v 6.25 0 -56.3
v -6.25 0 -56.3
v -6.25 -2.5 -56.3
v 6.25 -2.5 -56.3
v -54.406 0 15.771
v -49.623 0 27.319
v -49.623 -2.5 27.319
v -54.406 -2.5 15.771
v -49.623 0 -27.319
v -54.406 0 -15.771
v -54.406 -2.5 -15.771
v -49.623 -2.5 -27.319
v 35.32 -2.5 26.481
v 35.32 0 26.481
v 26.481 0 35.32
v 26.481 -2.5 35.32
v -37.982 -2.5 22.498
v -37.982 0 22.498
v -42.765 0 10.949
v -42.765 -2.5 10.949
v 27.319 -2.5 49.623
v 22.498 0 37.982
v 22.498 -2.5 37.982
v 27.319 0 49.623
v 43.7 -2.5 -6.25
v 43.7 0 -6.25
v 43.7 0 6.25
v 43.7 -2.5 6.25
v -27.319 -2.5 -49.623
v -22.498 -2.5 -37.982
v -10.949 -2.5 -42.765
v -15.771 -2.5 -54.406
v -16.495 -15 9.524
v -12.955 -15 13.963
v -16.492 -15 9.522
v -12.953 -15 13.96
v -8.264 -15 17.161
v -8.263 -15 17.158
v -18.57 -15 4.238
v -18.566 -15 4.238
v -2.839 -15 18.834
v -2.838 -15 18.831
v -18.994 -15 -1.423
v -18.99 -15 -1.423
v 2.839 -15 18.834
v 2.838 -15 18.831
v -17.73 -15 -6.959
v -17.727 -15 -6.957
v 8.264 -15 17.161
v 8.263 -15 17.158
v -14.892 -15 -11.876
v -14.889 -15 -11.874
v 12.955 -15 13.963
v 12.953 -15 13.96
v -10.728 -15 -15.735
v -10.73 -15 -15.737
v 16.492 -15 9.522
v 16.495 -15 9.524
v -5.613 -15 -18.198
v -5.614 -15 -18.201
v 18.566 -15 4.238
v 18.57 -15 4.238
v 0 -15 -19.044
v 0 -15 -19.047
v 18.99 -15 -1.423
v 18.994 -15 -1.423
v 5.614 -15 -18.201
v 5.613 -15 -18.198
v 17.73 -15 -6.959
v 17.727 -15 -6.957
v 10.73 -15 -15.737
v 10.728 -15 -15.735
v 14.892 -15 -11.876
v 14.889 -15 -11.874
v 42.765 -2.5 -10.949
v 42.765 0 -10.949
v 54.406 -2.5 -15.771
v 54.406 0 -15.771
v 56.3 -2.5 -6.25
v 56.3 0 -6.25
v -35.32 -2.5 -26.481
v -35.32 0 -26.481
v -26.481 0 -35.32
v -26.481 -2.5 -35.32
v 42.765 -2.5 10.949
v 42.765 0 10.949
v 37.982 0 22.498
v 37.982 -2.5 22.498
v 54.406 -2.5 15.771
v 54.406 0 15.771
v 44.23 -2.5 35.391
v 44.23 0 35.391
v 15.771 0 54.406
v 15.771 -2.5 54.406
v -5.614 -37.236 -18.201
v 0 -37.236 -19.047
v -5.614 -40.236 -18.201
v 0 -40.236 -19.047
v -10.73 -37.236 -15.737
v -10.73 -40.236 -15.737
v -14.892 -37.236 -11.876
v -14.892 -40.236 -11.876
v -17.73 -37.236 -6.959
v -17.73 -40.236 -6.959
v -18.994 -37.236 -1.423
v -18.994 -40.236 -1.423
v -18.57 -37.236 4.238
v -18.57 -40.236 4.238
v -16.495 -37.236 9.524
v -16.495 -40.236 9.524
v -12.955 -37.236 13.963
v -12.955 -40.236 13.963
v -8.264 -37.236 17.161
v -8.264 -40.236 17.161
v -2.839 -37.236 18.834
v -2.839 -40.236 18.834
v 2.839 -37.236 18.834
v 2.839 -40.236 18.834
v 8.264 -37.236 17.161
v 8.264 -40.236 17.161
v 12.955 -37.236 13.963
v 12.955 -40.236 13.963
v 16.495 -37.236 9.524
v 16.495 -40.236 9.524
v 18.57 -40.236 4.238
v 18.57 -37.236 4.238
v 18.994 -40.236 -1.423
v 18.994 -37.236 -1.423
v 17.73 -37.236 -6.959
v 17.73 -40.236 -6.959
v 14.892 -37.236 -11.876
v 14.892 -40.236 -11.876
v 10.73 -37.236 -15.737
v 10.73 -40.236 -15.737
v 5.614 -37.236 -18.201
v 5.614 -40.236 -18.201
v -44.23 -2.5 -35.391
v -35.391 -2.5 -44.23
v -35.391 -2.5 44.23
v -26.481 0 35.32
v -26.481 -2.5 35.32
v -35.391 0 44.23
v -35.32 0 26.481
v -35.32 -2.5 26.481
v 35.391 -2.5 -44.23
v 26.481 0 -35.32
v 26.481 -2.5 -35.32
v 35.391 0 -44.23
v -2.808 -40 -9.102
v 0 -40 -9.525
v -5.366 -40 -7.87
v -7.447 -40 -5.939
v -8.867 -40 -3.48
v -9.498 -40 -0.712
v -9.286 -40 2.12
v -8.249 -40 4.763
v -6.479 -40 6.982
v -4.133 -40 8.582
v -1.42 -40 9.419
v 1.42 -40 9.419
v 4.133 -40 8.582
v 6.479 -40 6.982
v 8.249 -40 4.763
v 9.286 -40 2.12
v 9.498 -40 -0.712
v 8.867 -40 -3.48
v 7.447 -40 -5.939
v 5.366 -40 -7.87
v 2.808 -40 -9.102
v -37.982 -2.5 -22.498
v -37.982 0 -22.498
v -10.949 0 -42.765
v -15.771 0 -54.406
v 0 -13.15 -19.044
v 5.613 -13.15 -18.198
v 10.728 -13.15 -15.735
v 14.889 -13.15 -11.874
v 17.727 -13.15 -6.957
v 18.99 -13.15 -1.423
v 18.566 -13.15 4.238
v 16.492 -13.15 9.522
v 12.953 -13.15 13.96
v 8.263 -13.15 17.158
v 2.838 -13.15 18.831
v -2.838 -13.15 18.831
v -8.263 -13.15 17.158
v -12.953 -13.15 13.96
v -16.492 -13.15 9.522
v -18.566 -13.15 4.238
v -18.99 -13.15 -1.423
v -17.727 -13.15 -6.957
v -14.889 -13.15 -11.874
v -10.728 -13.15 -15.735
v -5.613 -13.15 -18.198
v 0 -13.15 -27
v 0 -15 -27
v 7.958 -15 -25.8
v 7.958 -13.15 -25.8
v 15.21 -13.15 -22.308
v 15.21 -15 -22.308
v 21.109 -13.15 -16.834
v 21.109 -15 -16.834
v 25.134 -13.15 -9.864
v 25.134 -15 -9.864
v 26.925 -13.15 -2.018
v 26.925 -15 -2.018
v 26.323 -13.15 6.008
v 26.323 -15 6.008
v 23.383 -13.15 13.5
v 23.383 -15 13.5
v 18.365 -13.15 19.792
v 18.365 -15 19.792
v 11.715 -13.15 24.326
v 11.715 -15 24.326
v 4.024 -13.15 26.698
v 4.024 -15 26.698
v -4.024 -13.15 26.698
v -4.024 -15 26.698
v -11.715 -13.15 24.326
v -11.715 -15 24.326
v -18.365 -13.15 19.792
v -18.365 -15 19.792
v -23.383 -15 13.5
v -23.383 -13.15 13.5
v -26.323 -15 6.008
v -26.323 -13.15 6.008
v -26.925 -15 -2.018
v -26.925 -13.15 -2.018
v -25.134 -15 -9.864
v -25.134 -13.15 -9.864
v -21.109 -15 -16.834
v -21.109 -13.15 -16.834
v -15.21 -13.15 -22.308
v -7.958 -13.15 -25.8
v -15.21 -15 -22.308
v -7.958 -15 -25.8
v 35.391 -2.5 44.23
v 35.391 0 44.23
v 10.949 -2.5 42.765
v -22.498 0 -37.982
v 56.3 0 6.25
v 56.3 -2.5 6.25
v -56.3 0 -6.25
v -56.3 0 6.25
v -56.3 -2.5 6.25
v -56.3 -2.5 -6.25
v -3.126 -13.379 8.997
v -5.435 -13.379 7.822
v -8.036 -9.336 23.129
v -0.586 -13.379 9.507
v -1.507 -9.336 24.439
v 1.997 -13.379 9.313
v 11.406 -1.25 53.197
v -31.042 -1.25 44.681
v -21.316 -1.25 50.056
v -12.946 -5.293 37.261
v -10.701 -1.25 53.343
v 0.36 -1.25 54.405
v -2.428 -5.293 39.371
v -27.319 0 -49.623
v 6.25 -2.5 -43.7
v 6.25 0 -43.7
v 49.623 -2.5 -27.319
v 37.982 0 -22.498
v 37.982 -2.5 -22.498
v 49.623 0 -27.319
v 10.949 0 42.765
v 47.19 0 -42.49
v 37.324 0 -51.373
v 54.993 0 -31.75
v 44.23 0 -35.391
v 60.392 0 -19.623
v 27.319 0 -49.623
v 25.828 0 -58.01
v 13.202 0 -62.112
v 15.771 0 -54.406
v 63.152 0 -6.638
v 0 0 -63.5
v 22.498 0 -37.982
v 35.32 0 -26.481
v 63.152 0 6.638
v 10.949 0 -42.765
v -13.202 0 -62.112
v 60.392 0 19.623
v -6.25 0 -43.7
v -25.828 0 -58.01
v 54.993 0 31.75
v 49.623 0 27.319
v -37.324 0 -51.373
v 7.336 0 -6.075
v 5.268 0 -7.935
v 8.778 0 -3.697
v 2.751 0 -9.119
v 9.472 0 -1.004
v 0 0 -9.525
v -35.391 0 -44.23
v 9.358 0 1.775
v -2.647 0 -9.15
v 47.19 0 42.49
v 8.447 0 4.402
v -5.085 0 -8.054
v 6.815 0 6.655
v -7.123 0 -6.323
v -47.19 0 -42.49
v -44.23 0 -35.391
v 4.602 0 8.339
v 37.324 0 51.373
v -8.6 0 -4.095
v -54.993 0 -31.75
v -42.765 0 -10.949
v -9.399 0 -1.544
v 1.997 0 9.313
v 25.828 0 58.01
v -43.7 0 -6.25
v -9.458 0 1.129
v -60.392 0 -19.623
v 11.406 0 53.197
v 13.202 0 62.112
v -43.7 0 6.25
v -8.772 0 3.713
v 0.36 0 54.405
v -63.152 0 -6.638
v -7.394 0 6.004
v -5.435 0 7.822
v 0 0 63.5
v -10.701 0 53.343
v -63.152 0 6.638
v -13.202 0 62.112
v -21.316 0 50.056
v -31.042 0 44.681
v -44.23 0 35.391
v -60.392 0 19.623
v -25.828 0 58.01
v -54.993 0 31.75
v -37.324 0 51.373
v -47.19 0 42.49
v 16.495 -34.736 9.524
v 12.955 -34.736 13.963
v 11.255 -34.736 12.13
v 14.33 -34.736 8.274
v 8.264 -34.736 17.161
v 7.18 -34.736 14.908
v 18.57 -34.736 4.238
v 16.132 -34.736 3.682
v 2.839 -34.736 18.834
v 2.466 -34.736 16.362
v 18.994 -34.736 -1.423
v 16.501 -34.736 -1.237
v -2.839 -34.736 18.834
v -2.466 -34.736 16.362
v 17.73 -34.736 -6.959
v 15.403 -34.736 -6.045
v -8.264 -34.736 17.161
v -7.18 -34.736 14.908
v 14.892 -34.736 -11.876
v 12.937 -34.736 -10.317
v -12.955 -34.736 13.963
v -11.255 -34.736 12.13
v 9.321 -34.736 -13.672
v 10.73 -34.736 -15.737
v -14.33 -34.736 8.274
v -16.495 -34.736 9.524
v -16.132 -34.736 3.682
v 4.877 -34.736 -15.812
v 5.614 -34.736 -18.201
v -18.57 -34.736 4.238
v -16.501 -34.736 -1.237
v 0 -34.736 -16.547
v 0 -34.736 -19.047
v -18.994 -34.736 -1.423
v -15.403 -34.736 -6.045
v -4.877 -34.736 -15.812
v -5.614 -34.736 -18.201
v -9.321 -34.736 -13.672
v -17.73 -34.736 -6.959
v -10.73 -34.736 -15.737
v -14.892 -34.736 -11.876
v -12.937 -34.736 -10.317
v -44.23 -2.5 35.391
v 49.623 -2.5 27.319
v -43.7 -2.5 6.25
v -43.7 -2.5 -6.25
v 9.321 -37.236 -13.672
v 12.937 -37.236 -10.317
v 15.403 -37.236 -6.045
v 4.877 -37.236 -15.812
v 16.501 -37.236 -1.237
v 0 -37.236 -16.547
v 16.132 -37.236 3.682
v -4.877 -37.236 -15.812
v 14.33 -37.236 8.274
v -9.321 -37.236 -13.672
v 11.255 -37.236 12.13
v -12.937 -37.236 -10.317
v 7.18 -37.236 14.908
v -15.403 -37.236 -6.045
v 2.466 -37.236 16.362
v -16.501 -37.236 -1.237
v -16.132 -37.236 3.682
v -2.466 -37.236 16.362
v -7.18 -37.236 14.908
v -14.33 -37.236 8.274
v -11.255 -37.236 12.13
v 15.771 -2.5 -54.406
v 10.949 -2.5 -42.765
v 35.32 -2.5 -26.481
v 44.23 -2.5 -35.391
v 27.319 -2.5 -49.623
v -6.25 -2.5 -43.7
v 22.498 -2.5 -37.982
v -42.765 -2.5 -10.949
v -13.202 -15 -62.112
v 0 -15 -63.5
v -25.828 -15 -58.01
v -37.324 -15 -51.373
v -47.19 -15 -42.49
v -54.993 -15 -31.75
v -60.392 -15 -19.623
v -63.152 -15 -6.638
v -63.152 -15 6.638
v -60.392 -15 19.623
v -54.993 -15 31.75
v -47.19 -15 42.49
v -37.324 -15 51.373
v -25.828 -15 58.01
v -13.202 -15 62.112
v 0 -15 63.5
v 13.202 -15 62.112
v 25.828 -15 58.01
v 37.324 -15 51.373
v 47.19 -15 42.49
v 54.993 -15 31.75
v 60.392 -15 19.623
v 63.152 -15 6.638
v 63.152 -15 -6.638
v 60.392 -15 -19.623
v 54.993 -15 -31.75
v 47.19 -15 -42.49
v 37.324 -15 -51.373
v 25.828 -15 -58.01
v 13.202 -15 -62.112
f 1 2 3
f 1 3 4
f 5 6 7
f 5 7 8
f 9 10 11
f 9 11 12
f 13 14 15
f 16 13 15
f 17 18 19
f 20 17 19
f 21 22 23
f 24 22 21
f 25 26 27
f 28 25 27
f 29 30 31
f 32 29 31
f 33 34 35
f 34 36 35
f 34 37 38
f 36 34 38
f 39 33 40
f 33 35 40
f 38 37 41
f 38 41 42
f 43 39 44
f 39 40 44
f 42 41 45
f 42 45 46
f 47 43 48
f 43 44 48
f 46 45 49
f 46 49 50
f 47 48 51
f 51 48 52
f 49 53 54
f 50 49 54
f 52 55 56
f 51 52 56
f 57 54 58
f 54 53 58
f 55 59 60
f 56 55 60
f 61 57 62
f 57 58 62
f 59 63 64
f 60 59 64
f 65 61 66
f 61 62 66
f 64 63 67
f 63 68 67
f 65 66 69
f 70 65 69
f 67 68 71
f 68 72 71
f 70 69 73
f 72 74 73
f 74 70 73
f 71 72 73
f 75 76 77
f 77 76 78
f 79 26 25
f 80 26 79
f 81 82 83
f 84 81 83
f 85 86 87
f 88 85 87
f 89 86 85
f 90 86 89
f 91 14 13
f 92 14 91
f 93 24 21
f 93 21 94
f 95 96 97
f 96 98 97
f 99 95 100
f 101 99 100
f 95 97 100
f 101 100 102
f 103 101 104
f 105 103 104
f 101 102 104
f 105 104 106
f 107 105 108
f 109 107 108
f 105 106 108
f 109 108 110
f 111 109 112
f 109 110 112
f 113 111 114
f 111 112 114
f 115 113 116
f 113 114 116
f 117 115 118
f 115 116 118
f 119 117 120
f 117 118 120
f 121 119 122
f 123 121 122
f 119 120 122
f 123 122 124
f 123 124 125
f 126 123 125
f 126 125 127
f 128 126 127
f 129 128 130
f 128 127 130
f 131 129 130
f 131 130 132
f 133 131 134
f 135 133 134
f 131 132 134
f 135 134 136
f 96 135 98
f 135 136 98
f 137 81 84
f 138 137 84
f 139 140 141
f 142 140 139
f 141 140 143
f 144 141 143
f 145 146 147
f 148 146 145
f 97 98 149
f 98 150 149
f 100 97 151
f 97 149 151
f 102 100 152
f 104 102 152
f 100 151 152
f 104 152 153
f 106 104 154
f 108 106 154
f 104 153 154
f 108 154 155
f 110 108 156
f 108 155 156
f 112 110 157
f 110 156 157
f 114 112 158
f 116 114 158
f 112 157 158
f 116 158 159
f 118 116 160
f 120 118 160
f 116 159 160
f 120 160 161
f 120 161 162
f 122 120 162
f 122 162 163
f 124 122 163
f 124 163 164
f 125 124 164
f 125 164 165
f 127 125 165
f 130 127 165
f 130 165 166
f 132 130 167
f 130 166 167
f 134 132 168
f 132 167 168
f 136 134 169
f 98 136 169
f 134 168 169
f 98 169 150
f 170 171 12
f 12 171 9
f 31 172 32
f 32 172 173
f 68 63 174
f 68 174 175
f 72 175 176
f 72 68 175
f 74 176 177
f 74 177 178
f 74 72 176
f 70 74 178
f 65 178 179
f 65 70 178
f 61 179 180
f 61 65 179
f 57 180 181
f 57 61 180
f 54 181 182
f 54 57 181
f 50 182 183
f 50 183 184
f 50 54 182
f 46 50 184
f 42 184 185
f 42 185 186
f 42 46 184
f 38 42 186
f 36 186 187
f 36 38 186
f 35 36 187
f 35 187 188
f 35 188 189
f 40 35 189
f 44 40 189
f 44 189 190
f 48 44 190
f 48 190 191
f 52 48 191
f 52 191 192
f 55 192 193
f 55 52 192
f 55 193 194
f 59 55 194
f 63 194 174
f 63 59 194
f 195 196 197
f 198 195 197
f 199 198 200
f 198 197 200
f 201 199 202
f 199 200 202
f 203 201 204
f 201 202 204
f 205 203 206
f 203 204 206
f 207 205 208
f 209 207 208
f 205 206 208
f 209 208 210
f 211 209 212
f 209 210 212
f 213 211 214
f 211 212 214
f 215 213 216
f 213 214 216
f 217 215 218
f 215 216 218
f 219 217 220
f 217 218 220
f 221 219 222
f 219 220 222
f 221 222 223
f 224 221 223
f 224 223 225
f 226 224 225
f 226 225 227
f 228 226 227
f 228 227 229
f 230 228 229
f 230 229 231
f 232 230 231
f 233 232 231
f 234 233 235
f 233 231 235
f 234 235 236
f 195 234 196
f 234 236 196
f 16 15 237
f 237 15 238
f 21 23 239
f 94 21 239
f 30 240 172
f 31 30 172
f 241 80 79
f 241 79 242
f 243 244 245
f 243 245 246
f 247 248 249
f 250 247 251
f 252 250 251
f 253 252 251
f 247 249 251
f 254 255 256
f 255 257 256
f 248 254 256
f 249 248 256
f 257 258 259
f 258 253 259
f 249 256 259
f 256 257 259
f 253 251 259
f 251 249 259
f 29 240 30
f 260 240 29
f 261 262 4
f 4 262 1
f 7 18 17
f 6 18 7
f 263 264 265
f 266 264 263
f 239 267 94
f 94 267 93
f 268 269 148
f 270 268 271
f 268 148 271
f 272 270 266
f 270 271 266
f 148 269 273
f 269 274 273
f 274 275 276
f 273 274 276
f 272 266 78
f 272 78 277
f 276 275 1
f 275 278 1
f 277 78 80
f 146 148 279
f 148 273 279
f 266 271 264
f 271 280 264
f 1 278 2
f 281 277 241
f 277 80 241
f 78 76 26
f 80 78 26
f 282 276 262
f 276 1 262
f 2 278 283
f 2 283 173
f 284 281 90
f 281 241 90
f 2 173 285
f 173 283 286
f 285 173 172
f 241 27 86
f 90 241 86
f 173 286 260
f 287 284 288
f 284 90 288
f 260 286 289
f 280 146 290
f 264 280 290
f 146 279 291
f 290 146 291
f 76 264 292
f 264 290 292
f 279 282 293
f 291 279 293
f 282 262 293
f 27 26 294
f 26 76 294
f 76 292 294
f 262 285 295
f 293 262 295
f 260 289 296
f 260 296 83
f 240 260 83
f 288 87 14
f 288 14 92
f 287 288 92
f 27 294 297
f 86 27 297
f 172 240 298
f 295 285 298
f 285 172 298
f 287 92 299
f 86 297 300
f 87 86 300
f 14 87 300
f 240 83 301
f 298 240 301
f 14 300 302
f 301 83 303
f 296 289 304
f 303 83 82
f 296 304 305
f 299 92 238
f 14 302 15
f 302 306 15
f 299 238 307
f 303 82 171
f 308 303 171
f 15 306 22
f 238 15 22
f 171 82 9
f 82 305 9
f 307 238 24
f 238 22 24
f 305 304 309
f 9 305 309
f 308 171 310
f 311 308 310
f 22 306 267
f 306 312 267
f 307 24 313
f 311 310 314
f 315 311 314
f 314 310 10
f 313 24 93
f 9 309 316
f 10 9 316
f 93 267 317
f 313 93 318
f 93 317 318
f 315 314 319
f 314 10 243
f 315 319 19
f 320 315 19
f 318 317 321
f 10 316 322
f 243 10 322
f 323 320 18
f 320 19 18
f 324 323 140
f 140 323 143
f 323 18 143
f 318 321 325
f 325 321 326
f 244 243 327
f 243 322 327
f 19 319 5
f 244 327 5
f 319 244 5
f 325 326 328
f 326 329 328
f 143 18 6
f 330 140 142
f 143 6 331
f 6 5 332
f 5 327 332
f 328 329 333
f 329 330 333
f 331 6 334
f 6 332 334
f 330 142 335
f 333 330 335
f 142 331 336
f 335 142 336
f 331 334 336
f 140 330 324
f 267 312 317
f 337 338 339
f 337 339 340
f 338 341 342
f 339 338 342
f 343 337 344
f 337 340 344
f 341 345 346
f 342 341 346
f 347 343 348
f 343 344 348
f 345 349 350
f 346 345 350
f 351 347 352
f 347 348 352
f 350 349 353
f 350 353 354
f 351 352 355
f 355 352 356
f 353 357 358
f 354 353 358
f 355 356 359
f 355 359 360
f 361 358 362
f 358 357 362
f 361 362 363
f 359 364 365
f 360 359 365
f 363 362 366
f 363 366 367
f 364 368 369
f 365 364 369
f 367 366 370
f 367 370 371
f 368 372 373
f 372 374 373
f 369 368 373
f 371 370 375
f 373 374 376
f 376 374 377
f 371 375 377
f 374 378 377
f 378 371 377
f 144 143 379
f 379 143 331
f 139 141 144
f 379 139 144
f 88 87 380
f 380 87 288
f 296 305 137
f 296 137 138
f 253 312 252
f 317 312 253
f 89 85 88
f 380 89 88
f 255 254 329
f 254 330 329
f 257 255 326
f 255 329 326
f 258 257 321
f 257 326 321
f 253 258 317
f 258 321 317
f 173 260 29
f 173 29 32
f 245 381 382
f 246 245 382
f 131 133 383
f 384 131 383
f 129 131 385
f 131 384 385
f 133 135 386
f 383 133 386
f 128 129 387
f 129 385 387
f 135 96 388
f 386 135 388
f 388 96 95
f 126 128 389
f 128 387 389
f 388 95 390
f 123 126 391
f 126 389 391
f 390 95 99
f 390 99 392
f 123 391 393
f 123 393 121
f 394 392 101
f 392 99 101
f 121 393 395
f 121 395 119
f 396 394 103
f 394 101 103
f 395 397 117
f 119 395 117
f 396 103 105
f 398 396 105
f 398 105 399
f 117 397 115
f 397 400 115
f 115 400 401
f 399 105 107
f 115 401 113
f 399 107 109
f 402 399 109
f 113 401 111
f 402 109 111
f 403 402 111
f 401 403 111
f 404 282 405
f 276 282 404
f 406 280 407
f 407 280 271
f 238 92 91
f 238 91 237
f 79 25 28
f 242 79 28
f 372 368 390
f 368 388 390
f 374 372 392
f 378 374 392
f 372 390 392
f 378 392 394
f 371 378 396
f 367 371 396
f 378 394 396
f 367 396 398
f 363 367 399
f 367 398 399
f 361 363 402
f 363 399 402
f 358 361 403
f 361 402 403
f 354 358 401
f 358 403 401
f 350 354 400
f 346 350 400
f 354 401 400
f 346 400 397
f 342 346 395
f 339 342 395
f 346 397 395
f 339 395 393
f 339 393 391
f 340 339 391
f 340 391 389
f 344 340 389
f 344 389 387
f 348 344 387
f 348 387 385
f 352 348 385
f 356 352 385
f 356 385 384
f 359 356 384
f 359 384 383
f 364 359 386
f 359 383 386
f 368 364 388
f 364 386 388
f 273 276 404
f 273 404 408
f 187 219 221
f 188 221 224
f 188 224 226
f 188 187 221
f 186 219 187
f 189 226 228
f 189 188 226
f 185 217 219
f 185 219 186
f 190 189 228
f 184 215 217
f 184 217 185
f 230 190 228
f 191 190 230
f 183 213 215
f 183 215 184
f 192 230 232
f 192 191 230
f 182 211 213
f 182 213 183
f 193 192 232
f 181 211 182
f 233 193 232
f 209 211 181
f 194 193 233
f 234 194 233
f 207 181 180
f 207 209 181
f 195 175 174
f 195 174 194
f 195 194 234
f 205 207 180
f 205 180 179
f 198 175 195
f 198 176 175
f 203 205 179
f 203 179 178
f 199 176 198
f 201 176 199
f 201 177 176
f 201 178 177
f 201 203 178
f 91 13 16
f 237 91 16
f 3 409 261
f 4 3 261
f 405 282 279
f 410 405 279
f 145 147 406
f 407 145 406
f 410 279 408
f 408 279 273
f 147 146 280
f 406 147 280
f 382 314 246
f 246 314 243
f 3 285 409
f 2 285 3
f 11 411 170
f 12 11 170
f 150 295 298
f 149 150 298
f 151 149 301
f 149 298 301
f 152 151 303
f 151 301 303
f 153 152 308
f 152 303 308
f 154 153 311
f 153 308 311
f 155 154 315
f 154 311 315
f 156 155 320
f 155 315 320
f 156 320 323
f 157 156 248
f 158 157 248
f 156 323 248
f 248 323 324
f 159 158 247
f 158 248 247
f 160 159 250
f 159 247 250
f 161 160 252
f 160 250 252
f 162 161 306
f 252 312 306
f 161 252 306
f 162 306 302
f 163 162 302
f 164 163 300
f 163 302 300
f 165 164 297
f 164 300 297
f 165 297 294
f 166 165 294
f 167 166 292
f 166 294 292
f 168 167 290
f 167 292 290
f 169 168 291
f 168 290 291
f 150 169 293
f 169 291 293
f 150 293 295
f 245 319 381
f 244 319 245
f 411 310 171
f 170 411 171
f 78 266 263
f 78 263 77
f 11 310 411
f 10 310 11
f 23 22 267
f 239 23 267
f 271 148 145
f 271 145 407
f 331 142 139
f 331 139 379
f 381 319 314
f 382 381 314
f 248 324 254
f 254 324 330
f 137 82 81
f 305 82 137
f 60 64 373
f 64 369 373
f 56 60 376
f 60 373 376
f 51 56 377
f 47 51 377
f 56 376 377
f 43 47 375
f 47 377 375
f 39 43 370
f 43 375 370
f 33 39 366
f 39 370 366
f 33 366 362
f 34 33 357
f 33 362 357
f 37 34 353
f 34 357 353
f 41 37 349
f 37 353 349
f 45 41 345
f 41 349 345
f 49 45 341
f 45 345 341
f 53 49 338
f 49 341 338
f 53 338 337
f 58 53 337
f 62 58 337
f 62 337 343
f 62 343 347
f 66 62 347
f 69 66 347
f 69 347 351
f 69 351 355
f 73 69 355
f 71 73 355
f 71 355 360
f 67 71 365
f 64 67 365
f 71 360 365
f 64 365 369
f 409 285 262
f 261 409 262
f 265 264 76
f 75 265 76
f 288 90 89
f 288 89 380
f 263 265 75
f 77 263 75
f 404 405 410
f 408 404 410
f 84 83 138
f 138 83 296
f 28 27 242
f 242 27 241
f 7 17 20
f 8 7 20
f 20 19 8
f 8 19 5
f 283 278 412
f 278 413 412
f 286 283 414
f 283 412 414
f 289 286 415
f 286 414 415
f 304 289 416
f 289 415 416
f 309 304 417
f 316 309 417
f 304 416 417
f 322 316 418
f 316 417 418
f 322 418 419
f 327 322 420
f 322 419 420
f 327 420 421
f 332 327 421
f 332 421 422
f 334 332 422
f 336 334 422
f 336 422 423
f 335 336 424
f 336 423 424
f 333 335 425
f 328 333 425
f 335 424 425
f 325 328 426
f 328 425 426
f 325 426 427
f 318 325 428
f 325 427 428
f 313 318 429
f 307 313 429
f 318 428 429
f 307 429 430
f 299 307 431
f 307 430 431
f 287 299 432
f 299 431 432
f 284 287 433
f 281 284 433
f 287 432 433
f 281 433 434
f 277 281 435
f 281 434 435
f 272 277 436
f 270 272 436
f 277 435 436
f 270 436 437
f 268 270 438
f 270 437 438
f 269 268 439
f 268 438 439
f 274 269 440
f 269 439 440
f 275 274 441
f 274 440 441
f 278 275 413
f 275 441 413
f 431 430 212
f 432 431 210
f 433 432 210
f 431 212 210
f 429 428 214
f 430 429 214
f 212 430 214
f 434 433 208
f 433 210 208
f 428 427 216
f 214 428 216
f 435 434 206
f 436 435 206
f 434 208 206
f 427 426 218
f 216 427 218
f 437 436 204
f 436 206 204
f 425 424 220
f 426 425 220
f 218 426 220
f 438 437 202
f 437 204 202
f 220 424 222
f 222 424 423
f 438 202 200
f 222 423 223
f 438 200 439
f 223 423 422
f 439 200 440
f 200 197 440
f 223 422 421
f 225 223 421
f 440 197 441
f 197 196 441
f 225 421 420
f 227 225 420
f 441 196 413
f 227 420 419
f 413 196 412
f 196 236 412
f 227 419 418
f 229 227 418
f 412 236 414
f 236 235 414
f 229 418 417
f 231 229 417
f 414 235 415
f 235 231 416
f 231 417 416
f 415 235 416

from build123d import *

# Parameters (mm, degrees)
SKETCH3_W          = 12.5
SKETCH3_H          = 12.6
CUT_EXTRUDE1_DEPTH = 2.5
CIRPATTERN1_COUNT  = 16
CUT_SWEEP3_ANGLE   = 46.890766
SKETCH8_R          = 27
SKETCH8_R_2        = 19.043703719
CUT_EXTRUDE2_DEPTH = 1.85


# Read off the part's stored shape, not the designer's step: Cut-Sweep3
with BuildPart() as part:
    # Sketch1 → Revolve1 (revolve)
    with BuildSketch(Plane(origin=(0, 0, 0), x_dir=(0, 0, -1), z_dir=(1, 0, 0))):
        Polygon((9.525, 0), (63.5, 0), (63.5, -15), (19.047086271, -15), (19.047086271, -34.735580232), (16.547086271, -34.735580232), (16.547086271, -37.235580232), (19.047086271, -37.235580232), (19.047086271, -40.235580232), (9.525, -40), align=None)
    revolve(axis=Axis((0, 0, 0), (0, 1, 0)))

    # Sketch3 → Cut-Extrude1 (cut)
    with BuildSketch(Plane(origin=(0, 0, 0), x_dir=(1, 0, 0), z_dir=(0, 1, 0))):
        with Locations((0, 50)):
            Rectangle(SKETCH3_W, SKETCH3_H)
    cut_extrude1 = extrude(amount=-CUT_EXTRUDE1_DEPTH, mode=Mode.SUBTRACT)

    # CirPattern1: Cut-Extrude1 ×16 about axis, 2 skipped
    cirpattern1_axis = Axis((0, 0, 0), (0, -1, 0))
    add([cut_extrude1.rotate(cirpattern1_axis, i * 360 / CIRPATTERN1_COUNT) for i in range(1, CIRPATTERN1_COUNT) if i not in (8, 9)], mode=Mode.SUBTRACT)

    # Cut-Sweep3 outline → Cut-Sweep3 (revolve, cut)
    with BuildSketch(Plane(origin=(0, 0, 0), x_dir=(-0.5705578043075055, 0, 0.8212574455941318), z_dir=(-0.8212574455941318, 0, -0.5705578043075055))):
        Polygon((54.406189133, -1.25), (54.406189133, 0), (9.525, 0), (9.525, -13.378851836), align=None)
    revolve(axis=Axis((0, 0, 0), (0, 1, 0)), revolution_arc=CUT_SWEEP3_ANGLE, mode=Mode.SUBTRACT)

    # Sketch8 → Cut-Extrude2 (cut)
    with BuildSketch(Plane.XZ.offset(15)):
        with Locations(Location((0, 0, 0), (0, 0, 270))):
            Circle(SKETCH8_R)
        with Locations(Location((0, 0, 0), (0, 0, 270))):
            Circle(SKETCH8_R_2, mode=Mode.SUBTRACT)
    extrude(amount=-CUT_EXTRUDE2_DEPTH, mode=Mode.SUBTRACT)


solid = part.part
